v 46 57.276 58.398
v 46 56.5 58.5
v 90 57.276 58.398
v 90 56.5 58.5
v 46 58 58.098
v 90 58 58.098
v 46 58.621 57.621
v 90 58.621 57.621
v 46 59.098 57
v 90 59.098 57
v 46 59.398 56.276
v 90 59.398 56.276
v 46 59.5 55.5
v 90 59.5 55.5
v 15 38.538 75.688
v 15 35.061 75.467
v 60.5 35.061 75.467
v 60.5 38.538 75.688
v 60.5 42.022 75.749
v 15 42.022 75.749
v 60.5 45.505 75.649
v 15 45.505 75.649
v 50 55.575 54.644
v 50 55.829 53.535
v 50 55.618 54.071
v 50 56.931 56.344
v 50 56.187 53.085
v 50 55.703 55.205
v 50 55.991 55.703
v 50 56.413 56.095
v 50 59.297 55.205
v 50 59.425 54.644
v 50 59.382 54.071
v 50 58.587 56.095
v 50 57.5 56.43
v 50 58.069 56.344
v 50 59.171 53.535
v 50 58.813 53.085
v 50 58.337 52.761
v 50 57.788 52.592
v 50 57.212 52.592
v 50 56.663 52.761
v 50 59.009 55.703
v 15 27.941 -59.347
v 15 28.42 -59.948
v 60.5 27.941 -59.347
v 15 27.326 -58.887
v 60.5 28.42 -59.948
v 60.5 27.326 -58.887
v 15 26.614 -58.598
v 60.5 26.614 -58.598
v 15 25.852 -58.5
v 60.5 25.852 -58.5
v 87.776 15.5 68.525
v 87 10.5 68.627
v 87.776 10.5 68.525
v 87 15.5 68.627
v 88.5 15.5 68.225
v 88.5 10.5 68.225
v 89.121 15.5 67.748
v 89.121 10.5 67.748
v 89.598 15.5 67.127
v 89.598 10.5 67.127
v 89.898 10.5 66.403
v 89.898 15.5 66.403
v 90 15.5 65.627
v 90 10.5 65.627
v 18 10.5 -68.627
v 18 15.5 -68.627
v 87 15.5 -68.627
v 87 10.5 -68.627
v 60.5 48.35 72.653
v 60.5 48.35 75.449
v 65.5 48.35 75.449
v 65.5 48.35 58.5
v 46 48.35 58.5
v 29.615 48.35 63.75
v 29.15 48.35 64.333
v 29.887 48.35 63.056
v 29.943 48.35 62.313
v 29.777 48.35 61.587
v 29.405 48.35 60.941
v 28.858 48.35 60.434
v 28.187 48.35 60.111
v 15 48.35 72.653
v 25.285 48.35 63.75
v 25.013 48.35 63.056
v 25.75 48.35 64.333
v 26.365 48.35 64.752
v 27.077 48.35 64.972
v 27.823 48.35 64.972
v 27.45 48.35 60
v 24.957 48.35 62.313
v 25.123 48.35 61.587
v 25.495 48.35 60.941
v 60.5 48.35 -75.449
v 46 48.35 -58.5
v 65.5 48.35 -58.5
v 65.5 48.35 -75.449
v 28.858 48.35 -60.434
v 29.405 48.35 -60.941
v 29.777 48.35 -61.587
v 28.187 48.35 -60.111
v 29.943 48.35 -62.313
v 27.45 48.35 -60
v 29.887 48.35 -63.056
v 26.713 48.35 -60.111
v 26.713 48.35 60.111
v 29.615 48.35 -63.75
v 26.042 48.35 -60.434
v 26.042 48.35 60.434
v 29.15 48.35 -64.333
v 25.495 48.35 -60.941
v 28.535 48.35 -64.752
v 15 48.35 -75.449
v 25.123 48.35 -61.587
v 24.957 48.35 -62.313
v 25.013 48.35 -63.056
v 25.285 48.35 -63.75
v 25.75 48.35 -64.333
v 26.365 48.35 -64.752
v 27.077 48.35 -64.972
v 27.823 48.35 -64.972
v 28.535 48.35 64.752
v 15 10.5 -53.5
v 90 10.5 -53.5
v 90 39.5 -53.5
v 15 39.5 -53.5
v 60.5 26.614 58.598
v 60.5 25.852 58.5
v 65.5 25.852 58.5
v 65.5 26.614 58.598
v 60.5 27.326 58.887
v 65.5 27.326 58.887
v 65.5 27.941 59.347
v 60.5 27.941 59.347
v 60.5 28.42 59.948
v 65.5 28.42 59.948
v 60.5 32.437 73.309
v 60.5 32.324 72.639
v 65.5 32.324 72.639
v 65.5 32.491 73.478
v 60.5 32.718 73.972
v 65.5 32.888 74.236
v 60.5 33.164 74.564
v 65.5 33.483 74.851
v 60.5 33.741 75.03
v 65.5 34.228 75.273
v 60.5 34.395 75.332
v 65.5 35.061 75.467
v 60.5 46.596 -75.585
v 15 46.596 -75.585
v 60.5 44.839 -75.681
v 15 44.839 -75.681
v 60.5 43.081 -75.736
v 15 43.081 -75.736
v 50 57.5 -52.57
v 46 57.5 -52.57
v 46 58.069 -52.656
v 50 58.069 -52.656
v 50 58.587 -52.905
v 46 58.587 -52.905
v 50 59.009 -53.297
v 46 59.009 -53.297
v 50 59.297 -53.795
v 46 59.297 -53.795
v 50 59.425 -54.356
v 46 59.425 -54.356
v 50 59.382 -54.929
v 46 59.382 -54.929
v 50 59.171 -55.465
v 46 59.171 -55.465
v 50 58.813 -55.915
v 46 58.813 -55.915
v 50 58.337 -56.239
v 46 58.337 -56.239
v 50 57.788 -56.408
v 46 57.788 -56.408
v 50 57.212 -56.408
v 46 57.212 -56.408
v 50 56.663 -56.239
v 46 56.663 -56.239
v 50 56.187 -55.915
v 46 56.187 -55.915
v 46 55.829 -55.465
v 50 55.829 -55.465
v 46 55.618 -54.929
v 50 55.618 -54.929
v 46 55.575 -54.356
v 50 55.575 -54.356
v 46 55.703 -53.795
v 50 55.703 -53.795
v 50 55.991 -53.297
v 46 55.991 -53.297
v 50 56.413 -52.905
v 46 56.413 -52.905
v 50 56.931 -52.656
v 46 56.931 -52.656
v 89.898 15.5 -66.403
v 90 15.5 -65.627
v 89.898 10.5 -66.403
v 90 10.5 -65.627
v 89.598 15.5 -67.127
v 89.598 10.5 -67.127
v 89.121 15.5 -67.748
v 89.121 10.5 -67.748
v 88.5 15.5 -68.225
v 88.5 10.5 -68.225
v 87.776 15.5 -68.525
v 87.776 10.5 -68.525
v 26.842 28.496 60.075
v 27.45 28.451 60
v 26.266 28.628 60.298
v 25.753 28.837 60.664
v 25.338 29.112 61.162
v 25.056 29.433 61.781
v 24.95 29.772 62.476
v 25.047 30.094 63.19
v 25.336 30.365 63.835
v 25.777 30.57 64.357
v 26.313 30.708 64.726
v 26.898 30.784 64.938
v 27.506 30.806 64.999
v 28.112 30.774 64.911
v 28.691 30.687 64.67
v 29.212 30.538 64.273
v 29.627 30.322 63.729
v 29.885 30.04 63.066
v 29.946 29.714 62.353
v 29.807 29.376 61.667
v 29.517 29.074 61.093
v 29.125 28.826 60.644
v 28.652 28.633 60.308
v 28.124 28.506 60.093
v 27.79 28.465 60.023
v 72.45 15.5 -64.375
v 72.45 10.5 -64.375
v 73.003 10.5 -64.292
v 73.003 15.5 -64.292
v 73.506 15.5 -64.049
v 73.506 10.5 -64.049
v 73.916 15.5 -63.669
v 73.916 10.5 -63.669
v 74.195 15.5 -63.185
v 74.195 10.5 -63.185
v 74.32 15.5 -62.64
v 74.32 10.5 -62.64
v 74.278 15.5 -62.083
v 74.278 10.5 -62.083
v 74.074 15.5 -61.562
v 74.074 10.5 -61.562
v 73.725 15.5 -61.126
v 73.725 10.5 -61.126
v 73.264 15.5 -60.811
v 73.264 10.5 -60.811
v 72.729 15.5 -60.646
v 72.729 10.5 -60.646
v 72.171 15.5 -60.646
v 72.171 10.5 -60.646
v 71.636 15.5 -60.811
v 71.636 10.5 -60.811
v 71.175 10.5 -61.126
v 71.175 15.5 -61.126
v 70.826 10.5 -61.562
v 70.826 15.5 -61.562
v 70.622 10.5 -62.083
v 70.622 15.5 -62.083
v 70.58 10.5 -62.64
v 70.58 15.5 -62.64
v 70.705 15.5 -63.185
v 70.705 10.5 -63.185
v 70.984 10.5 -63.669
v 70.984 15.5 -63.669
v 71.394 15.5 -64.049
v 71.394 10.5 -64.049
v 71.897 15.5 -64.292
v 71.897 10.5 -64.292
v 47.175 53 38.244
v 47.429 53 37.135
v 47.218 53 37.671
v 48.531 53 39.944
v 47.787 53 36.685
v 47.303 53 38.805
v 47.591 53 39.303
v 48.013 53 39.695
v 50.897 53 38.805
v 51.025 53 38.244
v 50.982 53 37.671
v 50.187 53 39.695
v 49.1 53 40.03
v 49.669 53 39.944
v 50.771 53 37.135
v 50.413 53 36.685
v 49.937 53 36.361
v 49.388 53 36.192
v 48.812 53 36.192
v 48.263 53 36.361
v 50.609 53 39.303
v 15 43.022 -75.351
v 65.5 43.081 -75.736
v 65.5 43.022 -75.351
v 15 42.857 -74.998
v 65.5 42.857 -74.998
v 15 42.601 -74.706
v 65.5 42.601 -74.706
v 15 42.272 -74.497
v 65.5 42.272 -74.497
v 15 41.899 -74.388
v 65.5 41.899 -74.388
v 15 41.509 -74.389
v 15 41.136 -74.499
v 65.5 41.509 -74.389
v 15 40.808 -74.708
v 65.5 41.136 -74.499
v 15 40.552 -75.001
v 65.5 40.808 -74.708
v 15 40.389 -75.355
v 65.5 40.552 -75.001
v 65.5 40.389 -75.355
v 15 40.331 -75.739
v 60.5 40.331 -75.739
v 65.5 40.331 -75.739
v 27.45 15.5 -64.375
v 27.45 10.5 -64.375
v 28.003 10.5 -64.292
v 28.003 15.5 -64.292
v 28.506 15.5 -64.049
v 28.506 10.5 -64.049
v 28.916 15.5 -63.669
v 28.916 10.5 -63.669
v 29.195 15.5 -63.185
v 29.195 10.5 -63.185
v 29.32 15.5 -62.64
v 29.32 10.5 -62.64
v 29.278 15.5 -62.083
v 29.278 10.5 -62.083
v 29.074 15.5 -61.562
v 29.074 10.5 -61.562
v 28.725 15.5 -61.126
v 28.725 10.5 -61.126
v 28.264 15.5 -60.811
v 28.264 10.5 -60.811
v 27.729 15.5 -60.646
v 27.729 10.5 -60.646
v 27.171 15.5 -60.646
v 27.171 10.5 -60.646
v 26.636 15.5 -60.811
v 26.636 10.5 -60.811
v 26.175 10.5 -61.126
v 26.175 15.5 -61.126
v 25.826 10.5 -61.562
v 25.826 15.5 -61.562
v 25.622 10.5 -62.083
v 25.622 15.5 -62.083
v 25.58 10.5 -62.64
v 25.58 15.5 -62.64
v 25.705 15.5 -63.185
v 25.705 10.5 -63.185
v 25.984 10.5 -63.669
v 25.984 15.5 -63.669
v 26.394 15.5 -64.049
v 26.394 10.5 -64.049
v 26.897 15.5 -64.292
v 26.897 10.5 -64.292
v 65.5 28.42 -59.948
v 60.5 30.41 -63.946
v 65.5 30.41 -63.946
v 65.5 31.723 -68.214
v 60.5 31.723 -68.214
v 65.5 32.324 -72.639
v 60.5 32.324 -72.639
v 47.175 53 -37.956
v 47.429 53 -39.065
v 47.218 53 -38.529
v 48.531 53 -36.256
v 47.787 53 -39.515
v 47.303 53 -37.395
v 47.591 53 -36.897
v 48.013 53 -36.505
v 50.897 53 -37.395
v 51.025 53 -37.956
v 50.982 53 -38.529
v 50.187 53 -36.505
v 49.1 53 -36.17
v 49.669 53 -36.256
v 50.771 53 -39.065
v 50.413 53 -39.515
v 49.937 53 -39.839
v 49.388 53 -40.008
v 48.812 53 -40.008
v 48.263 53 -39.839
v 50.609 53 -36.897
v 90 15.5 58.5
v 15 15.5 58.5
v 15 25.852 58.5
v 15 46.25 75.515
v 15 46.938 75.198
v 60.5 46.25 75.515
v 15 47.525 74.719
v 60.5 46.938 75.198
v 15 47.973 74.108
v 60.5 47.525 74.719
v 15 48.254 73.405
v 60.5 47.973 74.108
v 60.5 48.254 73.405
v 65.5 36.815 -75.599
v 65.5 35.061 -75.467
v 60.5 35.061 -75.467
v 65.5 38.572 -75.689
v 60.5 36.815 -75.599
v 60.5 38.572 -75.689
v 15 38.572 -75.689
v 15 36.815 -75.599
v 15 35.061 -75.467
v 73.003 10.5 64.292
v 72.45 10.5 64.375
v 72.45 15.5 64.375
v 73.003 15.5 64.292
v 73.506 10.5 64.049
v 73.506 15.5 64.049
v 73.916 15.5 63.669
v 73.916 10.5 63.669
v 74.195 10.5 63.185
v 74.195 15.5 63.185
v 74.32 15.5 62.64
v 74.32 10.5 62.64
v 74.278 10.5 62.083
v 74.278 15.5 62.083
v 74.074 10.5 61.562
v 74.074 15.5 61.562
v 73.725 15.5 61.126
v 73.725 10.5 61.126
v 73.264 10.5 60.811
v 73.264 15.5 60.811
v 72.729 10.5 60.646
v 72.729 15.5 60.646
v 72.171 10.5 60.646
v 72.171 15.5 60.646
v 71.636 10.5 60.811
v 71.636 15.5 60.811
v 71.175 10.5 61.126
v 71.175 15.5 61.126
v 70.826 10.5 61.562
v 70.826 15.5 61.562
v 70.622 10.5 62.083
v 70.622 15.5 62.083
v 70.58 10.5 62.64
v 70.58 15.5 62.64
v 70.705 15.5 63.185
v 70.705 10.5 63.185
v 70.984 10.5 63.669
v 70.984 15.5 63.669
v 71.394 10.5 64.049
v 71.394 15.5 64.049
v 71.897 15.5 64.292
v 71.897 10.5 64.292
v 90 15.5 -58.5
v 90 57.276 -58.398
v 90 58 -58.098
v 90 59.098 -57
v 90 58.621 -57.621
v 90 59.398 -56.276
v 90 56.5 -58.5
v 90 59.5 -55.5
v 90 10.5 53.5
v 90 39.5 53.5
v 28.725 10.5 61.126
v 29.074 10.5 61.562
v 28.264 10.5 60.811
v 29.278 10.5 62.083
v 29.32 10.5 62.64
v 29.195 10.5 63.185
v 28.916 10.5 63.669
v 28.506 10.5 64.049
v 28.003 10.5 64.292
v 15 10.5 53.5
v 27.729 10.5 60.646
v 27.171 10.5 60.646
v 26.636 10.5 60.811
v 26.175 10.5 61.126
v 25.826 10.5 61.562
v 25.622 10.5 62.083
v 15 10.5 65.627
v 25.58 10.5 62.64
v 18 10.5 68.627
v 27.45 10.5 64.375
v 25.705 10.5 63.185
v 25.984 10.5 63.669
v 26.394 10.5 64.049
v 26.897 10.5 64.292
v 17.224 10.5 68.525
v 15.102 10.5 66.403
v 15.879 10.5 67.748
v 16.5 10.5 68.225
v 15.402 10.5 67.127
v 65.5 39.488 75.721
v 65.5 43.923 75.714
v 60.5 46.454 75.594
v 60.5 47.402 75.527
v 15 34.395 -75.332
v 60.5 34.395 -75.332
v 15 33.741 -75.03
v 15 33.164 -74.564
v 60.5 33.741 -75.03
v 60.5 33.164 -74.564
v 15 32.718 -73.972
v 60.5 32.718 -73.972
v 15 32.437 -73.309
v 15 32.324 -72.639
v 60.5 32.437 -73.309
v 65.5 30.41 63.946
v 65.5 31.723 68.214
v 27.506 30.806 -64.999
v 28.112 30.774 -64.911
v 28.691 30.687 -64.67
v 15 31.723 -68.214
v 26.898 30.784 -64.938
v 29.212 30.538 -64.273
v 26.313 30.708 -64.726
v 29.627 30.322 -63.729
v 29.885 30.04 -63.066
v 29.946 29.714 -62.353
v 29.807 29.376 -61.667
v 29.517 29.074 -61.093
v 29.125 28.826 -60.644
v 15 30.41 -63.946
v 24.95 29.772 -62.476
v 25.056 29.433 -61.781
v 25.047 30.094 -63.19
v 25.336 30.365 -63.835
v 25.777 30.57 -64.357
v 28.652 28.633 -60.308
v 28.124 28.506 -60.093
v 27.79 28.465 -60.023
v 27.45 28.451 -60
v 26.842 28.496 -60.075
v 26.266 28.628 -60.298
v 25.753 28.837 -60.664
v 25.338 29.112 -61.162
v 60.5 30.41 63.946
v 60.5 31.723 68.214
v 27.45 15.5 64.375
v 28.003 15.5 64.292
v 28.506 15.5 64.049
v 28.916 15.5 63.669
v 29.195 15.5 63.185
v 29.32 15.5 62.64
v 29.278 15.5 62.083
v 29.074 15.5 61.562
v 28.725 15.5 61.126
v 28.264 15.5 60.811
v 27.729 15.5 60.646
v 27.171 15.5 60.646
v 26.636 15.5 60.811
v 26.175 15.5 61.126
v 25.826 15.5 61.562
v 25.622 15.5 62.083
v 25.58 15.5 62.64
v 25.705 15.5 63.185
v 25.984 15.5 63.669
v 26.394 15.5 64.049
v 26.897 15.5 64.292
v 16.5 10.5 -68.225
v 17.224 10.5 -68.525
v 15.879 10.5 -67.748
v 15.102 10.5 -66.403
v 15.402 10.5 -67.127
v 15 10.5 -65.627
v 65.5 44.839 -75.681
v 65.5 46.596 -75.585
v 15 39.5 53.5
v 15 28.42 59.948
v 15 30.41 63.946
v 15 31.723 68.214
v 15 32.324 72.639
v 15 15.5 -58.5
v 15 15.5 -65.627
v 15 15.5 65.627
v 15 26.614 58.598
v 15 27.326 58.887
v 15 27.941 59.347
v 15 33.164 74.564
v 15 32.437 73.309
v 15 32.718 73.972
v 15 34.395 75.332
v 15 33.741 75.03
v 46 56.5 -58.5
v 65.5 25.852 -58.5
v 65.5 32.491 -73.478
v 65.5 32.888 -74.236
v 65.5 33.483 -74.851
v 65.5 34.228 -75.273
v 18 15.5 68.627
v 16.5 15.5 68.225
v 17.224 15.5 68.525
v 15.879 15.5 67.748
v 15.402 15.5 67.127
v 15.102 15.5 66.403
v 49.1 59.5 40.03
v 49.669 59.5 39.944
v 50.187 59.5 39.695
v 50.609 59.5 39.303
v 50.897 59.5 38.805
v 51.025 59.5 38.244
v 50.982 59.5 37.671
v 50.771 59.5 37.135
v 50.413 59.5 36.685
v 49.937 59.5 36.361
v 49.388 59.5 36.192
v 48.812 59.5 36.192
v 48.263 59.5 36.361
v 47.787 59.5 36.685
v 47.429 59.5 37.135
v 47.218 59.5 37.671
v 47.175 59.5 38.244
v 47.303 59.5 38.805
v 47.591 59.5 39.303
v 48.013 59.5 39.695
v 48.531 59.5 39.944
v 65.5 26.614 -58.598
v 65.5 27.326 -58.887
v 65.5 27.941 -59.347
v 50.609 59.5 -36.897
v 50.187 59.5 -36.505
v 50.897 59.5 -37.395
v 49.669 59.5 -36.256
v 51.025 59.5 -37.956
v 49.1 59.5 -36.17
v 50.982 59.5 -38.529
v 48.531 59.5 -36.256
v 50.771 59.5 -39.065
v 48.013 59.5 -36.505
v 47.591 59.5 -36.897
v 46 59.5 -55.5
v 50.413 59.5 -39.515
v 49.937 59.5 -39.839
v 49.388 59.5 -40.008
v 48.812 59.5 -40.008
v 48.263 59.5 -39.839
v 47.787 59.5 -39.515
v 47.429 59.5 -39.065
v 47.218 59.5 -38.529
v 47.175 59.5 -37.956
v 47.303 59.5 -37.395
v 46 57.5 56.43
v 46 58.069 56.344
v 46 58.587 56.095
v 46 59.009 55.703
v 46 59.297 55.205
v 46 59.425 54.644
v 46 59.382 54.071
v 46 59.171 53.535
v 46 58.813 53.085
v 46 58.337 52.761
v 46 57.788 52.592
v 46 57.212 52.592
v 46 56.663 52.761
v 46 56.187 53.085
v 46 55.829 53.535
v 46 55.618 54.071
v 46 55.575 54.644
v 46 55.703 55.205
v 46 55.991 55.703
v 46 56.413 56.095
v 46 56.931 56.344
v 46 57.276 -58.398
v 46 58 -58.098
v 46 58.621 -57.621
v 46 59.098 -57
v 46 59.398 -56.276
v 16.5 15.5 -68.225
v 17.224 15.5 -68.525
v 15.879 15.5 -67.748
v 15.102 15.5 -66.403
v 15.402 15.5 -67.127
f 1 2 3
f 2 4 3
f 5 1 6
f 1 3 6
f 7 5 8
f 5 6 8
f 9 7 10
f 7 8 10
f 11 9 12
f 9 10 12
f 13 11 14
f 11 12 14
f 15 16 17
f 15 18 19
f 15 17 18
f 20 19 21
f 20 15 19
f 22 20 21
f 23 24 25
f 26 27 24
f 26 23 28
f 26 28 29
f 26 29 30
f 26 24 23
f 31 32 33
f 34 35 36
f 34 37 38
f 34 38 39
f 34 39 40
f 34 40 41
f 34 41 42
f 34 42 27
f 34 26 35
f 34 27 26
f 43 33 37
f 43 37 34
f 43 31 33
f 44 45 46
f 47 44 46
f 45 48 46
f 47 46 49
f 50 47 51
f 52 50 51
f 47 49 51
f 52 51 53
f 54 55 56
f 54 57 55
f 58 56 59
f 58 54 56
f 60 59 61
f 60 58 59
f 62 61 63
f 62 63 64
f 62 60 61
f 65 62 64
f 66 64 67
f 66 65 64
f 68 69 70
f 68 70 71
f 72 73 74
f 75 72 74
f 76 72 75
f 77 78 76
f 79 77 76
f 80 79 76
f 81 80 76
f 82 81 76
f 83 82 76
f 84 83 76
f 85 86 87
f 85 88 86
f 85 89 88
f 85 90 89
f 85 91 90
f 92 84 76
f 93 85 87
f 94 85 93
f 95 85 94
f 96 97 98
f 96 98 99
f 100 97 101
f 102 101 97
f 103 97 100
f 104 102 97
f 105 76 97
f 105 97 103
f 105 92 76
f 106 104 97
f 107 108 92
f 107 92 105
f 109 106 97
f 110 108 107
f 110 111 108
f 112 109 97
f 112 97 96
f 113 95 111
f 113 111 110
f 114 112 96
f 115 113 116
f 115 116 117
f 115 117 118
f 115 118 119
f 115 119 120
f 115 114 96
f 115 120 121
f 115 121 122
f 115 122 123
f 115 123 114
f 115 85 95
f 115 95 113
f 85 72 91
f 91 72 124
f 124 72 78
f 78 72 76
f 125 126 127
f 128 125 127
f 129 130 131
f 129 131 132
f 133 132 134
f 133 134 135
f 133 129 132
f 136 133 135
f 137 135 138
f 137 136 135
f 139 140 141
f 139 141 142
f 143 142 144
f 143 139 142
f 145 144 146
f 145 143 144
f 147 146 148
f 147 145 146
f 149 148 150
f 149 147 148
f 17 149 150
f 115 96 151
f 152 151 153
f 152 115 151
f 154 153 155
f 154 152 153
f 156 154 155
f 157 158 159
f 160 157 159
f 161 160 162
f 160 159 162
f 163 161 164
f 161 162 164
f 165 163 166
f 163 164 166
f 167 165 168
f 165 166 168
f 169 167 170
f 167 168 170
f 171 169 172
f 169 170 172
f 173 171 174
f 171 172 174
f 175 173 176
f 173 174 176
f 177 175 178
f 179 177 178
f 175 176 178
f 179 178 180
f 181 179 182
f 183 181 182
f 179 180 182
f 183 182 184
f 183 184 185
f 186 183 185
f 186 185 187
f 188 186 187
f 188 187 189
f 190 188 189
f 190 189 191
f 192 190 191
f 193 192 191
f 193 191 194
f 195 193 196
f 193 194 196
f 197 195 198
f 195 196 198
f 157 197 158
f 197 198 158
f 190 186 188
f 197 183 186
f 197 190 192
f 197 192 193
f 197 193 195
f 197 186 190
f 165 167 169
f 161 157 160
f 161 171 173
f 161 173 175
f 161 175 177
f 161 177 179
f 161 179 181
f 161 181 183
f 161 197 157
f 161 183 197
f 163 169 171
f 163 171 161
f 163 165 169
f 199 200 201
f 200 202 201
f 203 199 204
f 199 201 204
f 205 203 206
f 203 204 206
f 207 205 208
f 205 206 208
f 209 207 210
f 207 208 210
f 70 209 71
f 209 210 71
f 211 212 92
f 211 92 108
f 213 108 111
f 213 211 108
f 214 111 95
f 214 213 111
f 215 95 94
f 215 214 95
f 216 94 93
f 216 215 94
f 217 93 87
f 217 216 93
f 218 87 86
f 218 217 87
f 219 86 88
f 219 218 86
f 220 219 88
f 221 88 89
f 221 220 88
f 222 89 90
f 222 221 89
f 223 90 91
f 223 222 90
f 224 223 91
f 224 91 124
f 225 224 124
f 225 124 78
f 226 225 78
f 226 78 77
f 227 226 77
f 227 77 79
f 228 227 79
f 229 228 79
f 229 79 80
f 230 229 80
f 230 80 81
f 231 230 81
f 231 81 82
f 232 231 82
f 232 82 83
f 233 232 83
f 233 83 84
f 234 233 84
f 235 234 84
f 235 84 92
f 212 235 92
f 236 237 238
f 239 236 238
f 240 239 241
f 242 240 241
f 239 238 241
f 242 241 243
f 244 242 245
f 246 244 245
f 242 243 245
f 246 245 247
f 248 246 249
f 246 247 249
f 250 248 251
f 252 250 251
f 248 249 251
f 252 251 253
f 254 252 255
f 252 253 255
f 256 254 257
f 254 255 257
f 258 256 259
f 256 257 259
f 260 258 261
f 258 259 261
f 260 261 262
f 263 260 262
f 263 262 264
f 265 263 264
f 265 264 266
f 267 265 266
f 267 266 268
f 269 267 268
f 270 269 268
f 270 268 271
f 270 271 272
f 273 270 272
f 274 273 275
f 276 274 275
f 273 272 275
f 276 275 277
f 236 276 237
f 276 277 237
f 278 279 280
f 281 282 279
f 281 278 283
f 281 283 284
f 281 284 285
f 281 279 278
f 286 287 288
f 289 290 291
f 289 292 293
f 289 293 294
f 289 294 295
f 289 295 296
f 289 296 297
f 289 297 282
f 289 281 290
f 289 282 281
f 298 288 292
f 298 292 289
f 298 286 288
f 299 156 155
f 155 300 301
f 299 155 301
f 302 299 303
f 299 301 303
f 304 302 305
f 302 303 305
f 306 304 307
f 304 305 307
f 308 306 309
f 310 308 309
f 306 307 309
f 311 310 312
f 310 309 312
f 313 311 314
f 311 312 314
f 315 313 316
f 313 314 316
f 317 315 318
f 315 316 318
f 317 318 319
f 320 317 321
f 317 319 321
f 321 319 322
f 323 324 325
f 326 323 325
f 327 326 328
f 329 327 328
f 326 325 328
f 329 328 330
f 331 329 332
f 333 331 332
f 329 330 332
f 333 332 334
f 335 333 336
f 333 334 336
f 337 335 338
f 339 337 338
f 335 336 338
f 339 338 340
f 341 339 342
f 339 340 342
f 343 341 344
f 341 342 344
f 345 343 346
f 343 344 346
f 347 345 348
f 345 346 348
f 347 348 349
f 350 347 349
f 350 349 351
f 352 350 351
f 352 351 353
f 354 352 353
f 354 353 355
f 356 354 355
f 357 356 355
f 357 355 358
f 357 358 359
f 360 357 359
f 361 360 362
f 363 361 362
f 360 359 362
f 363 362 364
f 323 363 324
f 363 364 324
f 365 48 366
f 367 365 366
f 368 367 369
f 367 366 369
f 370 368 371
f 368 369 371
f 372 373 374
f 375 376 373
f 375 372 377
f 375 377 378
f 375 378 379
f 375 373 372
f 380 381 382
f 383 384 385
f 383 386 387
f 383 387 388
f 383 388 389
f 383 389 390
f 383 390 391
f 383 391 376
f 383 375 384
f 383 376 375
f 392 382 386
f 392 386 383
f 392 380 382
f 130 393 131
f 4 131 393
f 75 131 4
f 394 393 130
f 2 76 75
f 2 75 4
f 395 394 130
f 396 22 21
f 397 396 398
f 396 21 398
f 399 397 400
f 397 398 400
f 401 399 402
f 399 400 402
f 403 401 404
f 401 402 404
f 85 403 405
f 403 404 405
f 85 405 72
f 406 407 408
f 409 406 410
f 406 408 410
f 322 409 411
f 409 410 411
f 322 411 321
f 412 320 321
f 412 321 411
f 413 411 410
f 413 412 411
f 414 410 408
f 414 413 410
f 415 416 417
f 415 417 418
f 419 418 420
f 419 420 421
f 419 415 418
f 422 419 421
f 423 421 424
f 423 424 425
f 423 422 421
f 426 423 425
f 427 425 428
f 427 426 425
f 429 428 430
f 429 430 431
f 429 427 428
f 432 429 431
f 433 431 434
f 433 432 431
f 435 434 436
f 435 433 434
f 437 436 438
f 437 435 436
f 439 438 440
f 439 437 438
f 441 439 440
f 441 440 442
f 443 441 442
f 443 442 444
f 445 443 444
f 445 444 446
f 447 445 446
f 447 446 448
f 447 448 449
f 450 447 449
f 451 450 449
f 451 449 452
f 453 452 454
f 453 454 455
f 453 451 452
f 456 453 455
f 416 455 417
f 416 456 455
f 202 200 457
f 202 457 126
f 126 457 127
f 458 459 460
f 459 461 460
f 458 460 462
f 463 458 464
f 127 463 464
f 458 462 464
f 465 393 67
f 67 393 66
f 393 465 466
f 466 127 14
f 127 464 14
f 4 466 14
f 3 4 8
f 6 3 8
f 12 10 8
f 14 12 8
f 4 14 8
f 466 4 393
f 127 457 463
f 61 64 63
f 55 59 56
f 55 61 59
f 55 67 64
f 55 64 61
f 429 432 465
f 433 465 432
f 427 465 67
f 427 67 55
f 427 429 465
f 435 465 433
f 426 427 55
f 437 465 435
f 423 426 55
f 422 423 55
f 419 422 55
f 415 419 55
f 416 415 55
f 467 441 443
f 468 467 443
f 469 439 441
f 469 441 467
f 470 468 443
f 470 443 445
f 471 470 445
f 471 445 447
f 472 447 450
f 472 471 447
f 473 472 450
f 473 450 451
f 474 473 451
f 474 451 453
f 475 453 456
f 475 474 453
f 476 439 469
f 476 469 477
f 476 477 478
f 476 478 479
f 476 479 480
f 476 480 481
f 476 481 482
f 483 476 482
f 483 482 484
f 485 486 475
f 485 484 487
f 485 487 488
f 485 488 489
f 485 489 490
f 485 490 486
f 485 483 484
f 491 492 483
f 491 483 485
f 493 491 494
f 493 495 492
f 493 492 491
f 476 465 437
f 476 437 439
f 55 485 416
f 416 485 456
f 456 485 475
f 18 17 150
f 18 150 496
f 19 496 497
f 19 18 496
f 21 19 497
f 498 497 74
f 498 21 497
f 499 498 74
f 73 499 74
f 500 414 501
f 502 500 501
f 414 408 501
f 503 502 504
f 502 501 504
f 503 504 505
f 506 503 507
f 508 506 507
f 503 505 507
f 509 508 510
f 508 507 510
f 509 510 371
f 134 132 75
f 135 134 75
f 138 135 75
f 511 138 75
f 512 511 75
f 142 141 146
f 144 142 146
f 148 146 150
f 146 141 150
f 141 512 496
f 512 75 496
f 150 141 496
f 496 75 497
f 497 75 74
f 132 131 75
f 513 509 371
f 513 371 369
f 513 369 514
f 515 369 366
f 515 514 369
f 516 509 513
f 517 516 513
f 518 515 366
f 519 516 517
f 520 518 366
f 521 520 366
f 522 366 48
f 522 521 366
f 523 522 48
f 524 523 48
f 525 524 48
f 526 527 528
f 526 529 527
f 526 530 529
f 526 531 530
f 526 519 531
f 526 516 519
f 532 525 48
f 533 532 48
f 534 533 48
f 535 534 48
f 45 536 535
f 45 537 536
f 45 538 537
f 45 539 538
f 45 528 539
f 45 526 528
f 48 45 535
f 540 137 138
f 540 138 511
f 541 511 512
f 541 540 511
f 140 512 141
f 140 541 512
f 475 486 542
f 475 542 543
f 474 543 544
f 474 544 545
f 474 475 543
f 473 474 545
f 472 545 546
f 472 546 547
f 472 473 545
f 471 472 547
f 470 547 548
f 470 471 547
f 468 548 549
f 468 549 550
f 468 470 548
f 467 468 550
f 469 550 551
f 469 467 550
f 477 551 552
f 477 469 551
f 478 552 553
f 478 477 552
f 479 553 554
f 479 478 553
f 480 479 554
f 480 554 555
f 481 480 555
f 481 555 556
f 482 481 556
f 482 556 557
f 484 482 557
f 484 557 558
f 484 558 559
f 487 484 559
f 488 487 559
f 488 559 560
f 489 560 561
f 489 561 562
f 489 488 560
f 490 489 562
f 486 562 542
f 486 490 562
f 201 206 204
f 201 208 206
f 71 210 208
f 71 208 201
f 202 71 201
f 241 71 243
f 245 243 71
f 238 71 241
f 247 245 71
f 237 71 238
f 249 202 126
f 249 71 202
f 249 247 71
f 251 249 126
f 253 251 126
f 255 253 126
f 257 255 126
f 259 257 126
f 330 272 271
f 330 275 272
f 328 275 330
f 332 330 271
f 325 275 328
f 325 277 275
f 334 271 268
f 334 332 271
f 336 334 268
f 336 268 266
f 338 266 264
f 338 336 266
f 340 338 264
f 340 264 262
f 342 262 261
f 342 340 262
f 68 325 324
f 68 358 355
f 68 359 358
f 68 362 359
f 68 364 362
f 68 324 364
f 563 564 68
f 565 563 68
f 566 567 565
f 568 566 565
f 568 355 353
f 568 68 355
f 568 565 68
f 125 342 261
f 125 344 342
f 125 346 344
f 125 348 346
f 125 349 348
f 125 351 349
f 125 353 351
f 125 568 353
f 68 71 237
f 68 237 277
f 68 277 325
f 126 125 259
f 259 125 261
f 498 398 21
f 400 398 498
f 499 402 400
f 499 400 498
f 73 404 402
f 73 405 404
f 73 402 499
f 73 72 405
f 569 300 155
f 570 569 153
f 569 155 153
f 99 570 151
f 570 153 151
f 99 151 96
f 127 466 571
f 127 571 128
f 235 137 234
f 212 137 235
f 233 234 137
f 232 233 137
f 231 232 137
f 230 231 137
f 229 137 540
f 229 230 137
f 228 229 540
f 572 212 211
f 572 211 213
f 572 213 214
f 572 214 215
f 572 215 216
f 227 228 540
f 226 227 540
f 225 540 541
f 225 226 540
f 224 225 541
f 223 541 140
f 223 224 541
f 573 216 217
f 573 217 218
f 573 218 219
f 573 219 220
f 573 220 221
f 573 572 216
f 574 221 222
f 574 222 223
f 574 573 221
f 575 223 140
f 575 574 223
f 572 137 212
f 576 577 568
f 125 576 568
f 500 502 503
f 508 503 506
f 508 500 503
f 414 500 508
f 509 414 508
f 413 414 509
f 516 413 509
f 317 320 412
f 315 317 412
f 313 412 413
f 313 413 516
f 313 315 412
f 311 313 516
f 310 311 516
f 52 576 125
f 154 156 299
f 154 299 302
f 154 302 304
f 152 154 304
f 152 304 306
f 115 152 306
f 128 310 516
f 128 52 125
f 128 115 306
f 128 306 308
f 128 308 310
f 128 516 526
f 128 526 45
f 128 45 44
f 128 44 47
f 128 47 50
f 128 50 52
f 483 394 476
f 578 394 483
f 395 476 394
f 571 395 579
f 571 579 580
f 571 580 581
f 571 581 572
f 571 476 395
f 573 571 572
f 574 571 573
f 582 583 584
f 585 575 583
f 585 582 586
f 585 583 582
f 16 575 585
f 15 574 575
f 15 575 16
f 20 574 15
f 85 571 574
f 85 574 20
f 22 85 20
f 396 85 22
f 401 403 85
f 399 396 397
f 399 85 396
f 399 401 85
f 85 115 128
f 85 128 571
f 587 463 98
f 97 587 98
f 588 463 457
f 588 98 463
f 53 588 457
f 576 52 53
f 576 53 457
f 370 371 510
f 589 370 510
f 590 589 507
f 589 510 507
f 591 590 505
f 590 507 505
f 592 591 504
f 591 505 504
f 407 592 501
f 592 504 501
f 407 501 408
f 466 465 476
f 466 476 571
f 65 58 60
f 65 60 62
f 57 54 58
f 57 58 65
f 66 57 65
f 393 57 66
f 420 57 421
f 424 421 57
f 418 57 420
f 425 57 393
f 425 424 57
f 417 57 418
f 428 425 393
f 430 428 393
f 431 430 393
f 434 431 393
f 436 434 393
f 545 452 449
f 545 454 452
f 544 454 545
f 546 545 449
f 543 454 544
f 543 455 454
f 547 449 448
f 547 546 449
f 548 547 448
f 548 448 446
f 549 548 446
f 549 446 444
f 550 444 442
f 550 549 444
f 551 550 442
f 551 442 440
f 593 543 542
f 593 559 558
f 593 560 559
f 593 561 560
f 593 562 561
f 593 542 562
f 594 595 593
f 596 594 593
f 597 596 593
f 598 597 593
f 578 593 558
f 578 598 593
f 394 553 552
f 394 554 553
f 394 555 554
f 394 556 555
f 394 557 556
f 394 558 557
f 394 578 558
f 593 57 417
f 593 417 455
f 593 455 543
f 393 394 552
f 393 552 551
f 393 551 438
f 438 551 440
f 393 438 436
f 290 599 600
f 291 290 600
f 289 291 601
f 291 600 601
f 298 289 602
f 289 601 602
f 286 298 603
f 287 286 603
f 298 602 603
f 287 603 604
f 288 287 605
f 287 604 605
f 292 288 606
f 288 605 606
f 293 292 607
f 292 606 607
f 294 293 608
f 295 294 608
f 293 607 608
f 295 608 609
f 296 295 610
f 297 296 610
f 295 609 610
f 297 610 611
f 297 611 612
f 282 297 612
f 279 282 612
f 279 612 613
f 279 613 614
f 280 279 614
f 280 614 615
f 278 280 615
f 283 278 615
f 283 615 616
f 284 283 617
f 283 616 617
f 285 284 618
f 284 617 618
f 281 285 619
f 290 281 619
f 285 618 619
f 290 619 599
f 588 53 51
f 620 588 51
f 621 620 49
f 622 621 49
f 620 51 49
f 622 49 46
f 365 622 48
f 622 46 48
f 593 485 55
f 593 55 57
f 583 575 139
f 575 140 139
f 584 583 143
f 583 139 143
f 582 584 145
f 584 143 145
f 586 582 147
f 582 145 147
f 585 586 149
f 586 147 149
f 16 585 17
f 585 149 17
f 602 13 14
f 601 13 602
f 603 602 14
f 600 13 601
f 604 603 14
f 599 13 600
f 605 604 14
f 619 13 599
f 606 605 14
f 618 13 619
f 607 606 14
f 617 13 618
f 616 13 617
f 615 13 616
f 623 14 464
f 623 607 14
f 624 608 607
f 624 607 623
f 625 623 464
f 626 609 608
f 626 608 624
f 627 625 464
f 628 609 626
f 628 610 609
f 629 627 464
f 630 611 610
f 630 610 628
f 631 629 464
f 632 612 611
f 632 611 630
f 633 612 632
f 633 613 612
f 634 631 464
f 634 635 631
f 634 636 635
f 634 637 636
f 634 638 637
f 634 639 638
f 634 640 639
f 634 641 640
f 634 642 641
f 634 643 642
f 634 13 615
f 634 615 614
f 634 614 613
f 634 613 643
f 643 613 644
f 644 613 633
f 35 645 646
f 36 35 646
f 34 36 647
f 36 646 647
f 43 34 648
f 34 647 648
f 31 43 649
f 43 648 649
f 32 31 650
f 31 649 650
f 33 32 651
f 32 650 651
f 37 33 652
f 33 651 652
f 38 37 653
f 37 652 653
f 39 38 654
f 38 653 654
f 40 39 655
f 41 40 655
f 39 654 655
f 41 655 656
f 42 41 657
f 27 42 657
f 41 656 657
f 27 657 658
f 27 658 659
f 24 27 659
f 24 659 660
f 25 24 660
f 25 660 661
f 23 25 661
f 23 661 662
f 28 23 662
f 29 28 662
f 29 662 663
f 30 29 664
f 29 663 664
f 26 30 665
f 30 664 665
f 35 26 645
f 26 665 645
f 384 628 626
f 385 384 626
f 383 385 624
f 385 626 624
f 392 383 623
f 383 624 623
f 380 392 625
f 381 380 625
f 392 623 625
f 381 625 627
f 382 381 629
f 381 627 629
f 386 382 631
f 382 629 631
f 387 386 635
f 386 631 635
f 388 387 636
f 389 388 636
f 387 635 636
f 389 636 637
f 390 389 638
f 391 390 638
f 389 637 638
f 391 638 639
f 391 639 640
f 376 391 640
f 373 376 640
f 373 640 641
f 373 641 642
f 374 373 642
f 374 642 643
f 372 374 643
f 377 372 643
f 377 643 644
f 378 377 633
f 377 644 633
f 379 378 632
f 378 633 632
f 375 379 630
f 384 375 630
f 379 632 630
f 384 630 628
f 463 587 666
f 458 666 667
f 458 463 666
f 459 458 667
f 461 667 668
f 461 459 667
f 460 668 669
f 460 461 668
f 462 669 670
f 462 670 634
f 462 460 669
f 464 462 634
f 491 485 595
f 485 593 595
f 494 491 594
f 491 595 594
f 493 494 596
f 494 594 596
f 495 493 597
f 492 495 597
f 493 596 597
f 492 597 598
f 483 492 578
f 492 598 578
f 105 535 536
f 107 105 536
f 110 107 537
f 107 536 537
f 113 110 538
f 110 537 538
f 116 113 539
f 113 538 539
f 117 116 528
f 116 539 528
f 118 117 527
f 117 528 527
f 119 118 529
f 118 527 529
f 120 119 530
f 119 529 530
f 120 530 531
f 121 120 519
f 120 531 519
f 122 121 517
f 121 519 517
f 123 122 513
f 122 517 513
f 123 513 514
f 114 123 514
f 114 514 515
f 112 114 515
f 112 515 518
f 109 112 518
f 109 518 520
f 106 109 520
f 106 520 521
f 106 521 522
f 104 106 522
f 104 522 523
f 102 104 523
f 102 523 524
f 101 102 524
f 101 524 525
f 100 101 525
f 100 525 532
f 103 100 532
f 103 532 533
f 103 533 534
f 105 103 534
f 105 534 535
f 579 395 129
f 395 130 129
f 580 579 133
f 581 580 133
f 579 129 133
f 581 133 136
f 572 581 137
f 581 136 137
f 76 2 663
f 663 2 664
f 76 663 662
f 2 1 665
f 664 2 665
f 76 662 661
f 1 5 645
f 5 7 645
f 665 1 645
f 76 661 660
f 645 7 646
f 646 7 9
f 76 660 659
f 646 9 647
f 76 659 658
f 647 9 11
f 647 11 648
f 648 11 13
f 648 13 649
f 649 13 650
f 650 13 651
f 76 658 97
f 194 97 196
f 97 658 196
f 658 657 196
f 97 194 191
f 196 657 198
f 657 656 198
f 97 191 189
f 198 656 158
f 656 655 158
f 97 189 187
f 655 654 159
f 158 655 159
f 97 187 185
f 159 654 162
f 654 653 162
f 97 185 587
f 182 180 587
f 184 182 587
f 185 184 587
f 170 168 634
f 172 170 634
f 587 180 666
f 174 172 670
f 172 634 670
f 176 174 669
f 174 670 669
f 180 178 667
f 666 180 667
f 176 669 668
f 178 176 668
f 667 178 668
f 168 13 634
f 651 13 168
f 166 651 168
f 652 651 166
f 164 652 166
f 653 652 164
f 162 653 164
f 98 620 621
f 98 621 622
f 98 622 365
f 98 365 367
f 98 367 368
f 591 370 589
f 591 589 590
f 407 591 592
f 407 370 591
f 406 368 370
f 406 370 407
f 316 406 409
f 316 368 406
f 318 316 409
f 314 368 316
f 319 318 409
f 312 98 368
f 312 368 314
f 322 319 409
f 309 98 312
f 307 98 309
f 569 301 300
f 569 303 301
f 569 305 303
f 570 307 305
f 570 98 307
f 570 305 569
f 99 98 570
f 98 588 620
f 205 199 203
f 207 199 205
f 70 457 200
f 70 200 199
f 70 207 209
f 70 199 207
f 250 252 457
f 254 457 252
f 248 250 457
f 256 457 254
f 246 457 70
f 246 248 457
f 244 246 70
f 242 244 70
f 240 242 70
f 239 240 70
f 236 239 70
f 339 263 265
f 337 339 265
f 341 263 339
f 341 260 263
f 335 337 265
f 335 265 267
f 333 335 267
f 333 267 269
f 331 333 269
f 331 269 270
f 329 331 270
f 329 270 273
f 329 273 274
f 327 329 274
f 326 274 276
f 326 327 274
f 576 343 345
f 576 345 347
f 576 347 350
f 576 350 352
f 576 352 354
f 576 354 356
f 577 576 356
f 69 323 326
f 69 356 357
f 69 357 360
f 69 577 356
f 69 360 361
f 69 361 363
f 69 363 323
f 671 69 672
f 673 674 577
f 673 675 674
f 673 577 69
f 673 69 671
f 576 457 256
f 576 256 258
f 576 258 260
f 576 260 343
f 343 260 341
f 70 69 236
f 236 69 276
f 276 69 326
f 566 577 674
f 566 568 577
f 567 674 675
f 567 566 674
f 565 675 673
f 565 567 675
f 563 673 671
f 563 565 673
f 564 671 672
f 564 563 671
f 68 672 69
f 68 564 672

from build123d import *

# Parameters (mm, degrees)
BOSS_EXTRUDE1_START = 15
BOSS_EXTRUDE1_DEPTH = 75
SKETCH2_W           = 107
SKETCH2_H           = 29
CUT_EXTRUDE1_DEPTH  = 123.079123932
CUT_EXTRUDE12_START = -29.5
CUT_EXTRUDE12_DEPTH = 29.5
SKETCH16_R          = 1.875
CUT_EXTRUDE13_DEPTH = 5
SKETCH17_W          = 46
SKETCH17_H          = 117
CUT_EXTRUDE14_DEPTH = 11.15
SKETCH14_R          = 1.93
CUT_EXTRUDE10_DEPTH = 6.5
FILLET1_R           = 3
BOSS_EXTRUDE3_DEPTH = 5
SKETCH21_R          = 1.375
CUT_EXTRUDE15_DEPTH = 50.5
SKETCH22_R          = 2.5
CUT_EXTRUDE16_DEPTH = 32.85
SKETCH23_R          = 1.93
CUT_EXTRUDE17_DEPTH = 4


with BuildPart() as part:
    # Sketch1 → Boss-Extrude1 (new body)
    with BuildSketch(Plane(origin=(0, 0, 0), x_dir=(0, 0, -1), z_dir=(1, 0, 0)).offset(BOSS_EXTRUDE1_START)):
        with BuildLine():
            Line((-68.626974957, 15.5), (-58.5, 15.5))
            Line((-58.5, 15.5), (-58.5, 27.48087198))
            ThreePointArc((-58.5, 27.48087198), (-66.444952459, 31.270691326), (-75.182099647, 32.341793222))
            ThreePointArc((-75.182099647, 32.341793222), (-75.739500667, 40.338834406), (-75.44865804, 48.35))
            Line((-75.44865804, 48.35), (-58.5, 48.35))
            Line((-58.5, 48.35), (-58.5, 59.5))
            Line((-58.5, 59.5), (58.5, 59.5))
            Line((58.5, 59.5), (58.5, 48.35))
            Line((58.5, 48.35), (75.44865804, 48.35))
            ThreePointArc((75.44865804, 48.35), (75.739500667, 40.338834406), (75.182099647, 32.341793222))
            ThreePointArc((75.182099647, 32.341793222), (66.444952459, 31.270691326), (58.5, 27.48087198))
            Line((58.5, 27.48087198), (58.5, 15.5))
            Line((58.5, 15.5), (68.626974957, 15.5))
            Line((68.626974957, 15.5), (68.626974957, 10.5))
            Line((68.626974957, 10.5), (-68.626974957, 10.5))
            Line((-68.626974957, 10.5), (-68.626974957, 15.5))
        make_face()
    extrude(amount=BOSS_EXTRUDE1_DEPTH)

    # Sketch2 → Cut-Extrude1 (cut, through all)
    with BuildSketch(Plane(origin=(90, 0, 0), x_dir=(0, 0, -1), z_dir=(1, 0, 0))):
        with Locations((0, 25)):
            Rectangle(SKETCH2_W, SKETCH2_H)
    extrude(amount=-CUT_EXTRUDE1_DEPTH, mode=Mode.SUBTRACT)

    # Sketch9 → Cut-Extrude12 (cut)
    with BuildSketch(Plane(origin=(90, 0, 0), x_dir=(0, 0, -1), z_dir=(1, 0, 0)).offset(CUT_EXTRUDE12_START)):
        with BuildLine():
            Line((-58.5, 27.48087198), (-58.5, 48.35))
            Line((-58.5, 48.35), (-75.44865804, 48.35))
            ThreePointArc((-75.44865804, 48.35), (-75.739500667, 40.338834406), (-75.182099647, 32.341793222))
            ThreePointArc((-75.182099647, 32.341793222), (-66.444952459, 31.270691326), (-58.5, 27.48087198))
        make_face()
        with BuildLine():
            Line((58.5, 27.48087198), (58.5, 48.35))
            Line((58.5, 48.35), (75.44865804, 48.35))
            ThreePointArc((75.44865804, 48.35), (75.739500667, 40.338834406), (75.182099647, 32.341793222))
            ThreePointArc((75.182099647, 32.341793222), (66.444952459, 31.270691326), (58.5, 27.48087198))
        make_face()
    extrude(amount=CUT_EXTRUDE12_DEPTH, mode=Mode.SUBTRACT)

    # Sketch16 → Cut-Extrude13 (cut)
    with BuildSketch(Plane.XZ.offset(-10.5)):
        with Locations(Location((27.45, -62.5, 0), (0, 0, 270))):
            Circle(SKETCH16_R)
        with Locations(Location((72.45, -62.5, 0), (0, 0, 270))):
            Circle(SKETCH16_R)
    cut_extrude13 = extrude(amount=-CUT_EXTRUDE13_DEPTH, mode=Mode.SUBTRACT)

    # Mirror2: Cut-Extrude13 across plane
    add(cut_extrude13.mirror(Plane.XY), mode=Mode.SUBTRACT)

    # Sketch17 → Cut-Extrude14 (cut)
    with BuildSketch(Plane(origin=(0, 59.5, 0), x_dir=(1, 0, 0), z_dir=(0, 1, 0))):
        with Locations((23, 0)):
            Rectangle(SKETCH17_W, SKETCH17_H)
    extrude(amount=-CUT_EXTRUDE14_DEPTH, mode=Mode.SUBTRACT)

    # Sketch14 → Cut-Extrude10 (cut)
    with BuildSketch(Plane(origin=(0, 59.5, 0), x_dir=(1, 0, 0), z_dir=(0, 1, 0))):
        with Locations(Location((49.1, 38.1, 0), (0, 0, 270))):
            Circle(SKETCH14_R)
        with Locations(Location((49.1, -38.1, 0), (0, 0, 270))):
            Circle(SKETCH14_R)
    extrude(amount=-CUT_EXTRUDE10_DEPTH, mode=Mode.SUBTRACT)

    # Fillet1
    fillet1_edges = [part.edges().sort_by_distance(p)[0] for p in [
        (90, 13, 68.626974957),
        (15, 13, -68.626974957),
        (15, 13, 68.626974957),
        (68, 59.5, 58.5),
        (68, 59.5, -58.5),
        (90, 13, -68.626974957),
        (37.75, 32.341793222, 75.182099647),
        (37.75, 48.35, 75.44865804),
        (37.75, 32.341793222, -75.182099647),
        (37.75, 27.48087198, -58.5),
        (37.75, 27.48087198, 58.5),
    ]]
    fillet(fillet1_edges, radius=FILLET1_R)

    # Sketch20 → Boss-Extrude3 (add)
    with BuildSketch(Plane(origin=(60.5, 0, 0), x_dir=(0, 0, -1), z_dir=(1, 0, 0))):
        with BuildLine():
            Line((75.44865804, 48.35), (58.5, 48.35))
            Line((58.5, 48.35), (58.5, 25.852098922))
            ThreePointArc((58.5, 25.852098922), (58.887094237, 27.326115025), (59.948482315, 28.41974237))
            ThreePointArc((59.948482315, 28.41974237), (66.053139575, 31.15333873), (72.638618282, 32.324175832))
            ThreePointArc((72.638618282, 32.324175832), (74.564449947, 33.163853344), (75.467231088, 35.060922699))
            ThreePointArc((75.467231088, 35.060922699), (75.749926018, 41.705869428), (75.44865804, 48.35))
        make_face()
    boss_extrude3 = extrude(amount=BOSS_EXTRUDE3_DEPTH)

    # Mirror4: Boss-Extrude3 across plane
    add(boss_extrude3.mirror(Plane.XY))

    # Sketch21 → Cut-Extrude15 (cut)
    with BuildSketch(Plane(origin=(65.5, 0, 0), x_dir=(0, 0, -1), z_dir=(1, 0, 0))):
        with Locations((75.749926018, 41.705869428)):
            Circle(SKETCH21_R)
    extrude(amount=-CUT_EXTRUDE15_DEPTH, mode=Mode.SUBTRACT)

    # Sketch22 → Cut-Extrude16 (cut)
    with BuildSketch(Plane(origin=(0, 15.5, 0), x_dir=(1, 0, 0), z_dir=(0, 1, 0))):
        with Locations(Location((27.45, -62.5, 0), (0, 0, 90))):
            Circle(SKETCH22_R)
    cut_extrude16 = extrude(amount=CUT_EXTRUDE16_DEPTH, mode=Mode.SUBTRACT)

    # Mirror5: Cut-Extrude16 across plane
    add(cut_extrude16.mirror(Plane.XY), mode=Mode.SUBTRACT)

    # Sketch23 → Cut-Extrude17 (cut)
    with BuildSketch(Plane(origin=(46, 2.35, 0), x_dir=(0, 1, 0), z_dir=(-1, 0, 0))):
        with Locations(Location((55.15, 54.5, 0), (0, 0, 270))):
            Circle(SKETCH23_R)
        with Locations(Location((55.15, -54.5, 0), (0, 0, 270))):
            Circle(SKETCH23_R)
    extrude(amount=-CUT_EXTRUDE17_DEPTH, mode=Mode.SUBTRACT)


solid = part.part
